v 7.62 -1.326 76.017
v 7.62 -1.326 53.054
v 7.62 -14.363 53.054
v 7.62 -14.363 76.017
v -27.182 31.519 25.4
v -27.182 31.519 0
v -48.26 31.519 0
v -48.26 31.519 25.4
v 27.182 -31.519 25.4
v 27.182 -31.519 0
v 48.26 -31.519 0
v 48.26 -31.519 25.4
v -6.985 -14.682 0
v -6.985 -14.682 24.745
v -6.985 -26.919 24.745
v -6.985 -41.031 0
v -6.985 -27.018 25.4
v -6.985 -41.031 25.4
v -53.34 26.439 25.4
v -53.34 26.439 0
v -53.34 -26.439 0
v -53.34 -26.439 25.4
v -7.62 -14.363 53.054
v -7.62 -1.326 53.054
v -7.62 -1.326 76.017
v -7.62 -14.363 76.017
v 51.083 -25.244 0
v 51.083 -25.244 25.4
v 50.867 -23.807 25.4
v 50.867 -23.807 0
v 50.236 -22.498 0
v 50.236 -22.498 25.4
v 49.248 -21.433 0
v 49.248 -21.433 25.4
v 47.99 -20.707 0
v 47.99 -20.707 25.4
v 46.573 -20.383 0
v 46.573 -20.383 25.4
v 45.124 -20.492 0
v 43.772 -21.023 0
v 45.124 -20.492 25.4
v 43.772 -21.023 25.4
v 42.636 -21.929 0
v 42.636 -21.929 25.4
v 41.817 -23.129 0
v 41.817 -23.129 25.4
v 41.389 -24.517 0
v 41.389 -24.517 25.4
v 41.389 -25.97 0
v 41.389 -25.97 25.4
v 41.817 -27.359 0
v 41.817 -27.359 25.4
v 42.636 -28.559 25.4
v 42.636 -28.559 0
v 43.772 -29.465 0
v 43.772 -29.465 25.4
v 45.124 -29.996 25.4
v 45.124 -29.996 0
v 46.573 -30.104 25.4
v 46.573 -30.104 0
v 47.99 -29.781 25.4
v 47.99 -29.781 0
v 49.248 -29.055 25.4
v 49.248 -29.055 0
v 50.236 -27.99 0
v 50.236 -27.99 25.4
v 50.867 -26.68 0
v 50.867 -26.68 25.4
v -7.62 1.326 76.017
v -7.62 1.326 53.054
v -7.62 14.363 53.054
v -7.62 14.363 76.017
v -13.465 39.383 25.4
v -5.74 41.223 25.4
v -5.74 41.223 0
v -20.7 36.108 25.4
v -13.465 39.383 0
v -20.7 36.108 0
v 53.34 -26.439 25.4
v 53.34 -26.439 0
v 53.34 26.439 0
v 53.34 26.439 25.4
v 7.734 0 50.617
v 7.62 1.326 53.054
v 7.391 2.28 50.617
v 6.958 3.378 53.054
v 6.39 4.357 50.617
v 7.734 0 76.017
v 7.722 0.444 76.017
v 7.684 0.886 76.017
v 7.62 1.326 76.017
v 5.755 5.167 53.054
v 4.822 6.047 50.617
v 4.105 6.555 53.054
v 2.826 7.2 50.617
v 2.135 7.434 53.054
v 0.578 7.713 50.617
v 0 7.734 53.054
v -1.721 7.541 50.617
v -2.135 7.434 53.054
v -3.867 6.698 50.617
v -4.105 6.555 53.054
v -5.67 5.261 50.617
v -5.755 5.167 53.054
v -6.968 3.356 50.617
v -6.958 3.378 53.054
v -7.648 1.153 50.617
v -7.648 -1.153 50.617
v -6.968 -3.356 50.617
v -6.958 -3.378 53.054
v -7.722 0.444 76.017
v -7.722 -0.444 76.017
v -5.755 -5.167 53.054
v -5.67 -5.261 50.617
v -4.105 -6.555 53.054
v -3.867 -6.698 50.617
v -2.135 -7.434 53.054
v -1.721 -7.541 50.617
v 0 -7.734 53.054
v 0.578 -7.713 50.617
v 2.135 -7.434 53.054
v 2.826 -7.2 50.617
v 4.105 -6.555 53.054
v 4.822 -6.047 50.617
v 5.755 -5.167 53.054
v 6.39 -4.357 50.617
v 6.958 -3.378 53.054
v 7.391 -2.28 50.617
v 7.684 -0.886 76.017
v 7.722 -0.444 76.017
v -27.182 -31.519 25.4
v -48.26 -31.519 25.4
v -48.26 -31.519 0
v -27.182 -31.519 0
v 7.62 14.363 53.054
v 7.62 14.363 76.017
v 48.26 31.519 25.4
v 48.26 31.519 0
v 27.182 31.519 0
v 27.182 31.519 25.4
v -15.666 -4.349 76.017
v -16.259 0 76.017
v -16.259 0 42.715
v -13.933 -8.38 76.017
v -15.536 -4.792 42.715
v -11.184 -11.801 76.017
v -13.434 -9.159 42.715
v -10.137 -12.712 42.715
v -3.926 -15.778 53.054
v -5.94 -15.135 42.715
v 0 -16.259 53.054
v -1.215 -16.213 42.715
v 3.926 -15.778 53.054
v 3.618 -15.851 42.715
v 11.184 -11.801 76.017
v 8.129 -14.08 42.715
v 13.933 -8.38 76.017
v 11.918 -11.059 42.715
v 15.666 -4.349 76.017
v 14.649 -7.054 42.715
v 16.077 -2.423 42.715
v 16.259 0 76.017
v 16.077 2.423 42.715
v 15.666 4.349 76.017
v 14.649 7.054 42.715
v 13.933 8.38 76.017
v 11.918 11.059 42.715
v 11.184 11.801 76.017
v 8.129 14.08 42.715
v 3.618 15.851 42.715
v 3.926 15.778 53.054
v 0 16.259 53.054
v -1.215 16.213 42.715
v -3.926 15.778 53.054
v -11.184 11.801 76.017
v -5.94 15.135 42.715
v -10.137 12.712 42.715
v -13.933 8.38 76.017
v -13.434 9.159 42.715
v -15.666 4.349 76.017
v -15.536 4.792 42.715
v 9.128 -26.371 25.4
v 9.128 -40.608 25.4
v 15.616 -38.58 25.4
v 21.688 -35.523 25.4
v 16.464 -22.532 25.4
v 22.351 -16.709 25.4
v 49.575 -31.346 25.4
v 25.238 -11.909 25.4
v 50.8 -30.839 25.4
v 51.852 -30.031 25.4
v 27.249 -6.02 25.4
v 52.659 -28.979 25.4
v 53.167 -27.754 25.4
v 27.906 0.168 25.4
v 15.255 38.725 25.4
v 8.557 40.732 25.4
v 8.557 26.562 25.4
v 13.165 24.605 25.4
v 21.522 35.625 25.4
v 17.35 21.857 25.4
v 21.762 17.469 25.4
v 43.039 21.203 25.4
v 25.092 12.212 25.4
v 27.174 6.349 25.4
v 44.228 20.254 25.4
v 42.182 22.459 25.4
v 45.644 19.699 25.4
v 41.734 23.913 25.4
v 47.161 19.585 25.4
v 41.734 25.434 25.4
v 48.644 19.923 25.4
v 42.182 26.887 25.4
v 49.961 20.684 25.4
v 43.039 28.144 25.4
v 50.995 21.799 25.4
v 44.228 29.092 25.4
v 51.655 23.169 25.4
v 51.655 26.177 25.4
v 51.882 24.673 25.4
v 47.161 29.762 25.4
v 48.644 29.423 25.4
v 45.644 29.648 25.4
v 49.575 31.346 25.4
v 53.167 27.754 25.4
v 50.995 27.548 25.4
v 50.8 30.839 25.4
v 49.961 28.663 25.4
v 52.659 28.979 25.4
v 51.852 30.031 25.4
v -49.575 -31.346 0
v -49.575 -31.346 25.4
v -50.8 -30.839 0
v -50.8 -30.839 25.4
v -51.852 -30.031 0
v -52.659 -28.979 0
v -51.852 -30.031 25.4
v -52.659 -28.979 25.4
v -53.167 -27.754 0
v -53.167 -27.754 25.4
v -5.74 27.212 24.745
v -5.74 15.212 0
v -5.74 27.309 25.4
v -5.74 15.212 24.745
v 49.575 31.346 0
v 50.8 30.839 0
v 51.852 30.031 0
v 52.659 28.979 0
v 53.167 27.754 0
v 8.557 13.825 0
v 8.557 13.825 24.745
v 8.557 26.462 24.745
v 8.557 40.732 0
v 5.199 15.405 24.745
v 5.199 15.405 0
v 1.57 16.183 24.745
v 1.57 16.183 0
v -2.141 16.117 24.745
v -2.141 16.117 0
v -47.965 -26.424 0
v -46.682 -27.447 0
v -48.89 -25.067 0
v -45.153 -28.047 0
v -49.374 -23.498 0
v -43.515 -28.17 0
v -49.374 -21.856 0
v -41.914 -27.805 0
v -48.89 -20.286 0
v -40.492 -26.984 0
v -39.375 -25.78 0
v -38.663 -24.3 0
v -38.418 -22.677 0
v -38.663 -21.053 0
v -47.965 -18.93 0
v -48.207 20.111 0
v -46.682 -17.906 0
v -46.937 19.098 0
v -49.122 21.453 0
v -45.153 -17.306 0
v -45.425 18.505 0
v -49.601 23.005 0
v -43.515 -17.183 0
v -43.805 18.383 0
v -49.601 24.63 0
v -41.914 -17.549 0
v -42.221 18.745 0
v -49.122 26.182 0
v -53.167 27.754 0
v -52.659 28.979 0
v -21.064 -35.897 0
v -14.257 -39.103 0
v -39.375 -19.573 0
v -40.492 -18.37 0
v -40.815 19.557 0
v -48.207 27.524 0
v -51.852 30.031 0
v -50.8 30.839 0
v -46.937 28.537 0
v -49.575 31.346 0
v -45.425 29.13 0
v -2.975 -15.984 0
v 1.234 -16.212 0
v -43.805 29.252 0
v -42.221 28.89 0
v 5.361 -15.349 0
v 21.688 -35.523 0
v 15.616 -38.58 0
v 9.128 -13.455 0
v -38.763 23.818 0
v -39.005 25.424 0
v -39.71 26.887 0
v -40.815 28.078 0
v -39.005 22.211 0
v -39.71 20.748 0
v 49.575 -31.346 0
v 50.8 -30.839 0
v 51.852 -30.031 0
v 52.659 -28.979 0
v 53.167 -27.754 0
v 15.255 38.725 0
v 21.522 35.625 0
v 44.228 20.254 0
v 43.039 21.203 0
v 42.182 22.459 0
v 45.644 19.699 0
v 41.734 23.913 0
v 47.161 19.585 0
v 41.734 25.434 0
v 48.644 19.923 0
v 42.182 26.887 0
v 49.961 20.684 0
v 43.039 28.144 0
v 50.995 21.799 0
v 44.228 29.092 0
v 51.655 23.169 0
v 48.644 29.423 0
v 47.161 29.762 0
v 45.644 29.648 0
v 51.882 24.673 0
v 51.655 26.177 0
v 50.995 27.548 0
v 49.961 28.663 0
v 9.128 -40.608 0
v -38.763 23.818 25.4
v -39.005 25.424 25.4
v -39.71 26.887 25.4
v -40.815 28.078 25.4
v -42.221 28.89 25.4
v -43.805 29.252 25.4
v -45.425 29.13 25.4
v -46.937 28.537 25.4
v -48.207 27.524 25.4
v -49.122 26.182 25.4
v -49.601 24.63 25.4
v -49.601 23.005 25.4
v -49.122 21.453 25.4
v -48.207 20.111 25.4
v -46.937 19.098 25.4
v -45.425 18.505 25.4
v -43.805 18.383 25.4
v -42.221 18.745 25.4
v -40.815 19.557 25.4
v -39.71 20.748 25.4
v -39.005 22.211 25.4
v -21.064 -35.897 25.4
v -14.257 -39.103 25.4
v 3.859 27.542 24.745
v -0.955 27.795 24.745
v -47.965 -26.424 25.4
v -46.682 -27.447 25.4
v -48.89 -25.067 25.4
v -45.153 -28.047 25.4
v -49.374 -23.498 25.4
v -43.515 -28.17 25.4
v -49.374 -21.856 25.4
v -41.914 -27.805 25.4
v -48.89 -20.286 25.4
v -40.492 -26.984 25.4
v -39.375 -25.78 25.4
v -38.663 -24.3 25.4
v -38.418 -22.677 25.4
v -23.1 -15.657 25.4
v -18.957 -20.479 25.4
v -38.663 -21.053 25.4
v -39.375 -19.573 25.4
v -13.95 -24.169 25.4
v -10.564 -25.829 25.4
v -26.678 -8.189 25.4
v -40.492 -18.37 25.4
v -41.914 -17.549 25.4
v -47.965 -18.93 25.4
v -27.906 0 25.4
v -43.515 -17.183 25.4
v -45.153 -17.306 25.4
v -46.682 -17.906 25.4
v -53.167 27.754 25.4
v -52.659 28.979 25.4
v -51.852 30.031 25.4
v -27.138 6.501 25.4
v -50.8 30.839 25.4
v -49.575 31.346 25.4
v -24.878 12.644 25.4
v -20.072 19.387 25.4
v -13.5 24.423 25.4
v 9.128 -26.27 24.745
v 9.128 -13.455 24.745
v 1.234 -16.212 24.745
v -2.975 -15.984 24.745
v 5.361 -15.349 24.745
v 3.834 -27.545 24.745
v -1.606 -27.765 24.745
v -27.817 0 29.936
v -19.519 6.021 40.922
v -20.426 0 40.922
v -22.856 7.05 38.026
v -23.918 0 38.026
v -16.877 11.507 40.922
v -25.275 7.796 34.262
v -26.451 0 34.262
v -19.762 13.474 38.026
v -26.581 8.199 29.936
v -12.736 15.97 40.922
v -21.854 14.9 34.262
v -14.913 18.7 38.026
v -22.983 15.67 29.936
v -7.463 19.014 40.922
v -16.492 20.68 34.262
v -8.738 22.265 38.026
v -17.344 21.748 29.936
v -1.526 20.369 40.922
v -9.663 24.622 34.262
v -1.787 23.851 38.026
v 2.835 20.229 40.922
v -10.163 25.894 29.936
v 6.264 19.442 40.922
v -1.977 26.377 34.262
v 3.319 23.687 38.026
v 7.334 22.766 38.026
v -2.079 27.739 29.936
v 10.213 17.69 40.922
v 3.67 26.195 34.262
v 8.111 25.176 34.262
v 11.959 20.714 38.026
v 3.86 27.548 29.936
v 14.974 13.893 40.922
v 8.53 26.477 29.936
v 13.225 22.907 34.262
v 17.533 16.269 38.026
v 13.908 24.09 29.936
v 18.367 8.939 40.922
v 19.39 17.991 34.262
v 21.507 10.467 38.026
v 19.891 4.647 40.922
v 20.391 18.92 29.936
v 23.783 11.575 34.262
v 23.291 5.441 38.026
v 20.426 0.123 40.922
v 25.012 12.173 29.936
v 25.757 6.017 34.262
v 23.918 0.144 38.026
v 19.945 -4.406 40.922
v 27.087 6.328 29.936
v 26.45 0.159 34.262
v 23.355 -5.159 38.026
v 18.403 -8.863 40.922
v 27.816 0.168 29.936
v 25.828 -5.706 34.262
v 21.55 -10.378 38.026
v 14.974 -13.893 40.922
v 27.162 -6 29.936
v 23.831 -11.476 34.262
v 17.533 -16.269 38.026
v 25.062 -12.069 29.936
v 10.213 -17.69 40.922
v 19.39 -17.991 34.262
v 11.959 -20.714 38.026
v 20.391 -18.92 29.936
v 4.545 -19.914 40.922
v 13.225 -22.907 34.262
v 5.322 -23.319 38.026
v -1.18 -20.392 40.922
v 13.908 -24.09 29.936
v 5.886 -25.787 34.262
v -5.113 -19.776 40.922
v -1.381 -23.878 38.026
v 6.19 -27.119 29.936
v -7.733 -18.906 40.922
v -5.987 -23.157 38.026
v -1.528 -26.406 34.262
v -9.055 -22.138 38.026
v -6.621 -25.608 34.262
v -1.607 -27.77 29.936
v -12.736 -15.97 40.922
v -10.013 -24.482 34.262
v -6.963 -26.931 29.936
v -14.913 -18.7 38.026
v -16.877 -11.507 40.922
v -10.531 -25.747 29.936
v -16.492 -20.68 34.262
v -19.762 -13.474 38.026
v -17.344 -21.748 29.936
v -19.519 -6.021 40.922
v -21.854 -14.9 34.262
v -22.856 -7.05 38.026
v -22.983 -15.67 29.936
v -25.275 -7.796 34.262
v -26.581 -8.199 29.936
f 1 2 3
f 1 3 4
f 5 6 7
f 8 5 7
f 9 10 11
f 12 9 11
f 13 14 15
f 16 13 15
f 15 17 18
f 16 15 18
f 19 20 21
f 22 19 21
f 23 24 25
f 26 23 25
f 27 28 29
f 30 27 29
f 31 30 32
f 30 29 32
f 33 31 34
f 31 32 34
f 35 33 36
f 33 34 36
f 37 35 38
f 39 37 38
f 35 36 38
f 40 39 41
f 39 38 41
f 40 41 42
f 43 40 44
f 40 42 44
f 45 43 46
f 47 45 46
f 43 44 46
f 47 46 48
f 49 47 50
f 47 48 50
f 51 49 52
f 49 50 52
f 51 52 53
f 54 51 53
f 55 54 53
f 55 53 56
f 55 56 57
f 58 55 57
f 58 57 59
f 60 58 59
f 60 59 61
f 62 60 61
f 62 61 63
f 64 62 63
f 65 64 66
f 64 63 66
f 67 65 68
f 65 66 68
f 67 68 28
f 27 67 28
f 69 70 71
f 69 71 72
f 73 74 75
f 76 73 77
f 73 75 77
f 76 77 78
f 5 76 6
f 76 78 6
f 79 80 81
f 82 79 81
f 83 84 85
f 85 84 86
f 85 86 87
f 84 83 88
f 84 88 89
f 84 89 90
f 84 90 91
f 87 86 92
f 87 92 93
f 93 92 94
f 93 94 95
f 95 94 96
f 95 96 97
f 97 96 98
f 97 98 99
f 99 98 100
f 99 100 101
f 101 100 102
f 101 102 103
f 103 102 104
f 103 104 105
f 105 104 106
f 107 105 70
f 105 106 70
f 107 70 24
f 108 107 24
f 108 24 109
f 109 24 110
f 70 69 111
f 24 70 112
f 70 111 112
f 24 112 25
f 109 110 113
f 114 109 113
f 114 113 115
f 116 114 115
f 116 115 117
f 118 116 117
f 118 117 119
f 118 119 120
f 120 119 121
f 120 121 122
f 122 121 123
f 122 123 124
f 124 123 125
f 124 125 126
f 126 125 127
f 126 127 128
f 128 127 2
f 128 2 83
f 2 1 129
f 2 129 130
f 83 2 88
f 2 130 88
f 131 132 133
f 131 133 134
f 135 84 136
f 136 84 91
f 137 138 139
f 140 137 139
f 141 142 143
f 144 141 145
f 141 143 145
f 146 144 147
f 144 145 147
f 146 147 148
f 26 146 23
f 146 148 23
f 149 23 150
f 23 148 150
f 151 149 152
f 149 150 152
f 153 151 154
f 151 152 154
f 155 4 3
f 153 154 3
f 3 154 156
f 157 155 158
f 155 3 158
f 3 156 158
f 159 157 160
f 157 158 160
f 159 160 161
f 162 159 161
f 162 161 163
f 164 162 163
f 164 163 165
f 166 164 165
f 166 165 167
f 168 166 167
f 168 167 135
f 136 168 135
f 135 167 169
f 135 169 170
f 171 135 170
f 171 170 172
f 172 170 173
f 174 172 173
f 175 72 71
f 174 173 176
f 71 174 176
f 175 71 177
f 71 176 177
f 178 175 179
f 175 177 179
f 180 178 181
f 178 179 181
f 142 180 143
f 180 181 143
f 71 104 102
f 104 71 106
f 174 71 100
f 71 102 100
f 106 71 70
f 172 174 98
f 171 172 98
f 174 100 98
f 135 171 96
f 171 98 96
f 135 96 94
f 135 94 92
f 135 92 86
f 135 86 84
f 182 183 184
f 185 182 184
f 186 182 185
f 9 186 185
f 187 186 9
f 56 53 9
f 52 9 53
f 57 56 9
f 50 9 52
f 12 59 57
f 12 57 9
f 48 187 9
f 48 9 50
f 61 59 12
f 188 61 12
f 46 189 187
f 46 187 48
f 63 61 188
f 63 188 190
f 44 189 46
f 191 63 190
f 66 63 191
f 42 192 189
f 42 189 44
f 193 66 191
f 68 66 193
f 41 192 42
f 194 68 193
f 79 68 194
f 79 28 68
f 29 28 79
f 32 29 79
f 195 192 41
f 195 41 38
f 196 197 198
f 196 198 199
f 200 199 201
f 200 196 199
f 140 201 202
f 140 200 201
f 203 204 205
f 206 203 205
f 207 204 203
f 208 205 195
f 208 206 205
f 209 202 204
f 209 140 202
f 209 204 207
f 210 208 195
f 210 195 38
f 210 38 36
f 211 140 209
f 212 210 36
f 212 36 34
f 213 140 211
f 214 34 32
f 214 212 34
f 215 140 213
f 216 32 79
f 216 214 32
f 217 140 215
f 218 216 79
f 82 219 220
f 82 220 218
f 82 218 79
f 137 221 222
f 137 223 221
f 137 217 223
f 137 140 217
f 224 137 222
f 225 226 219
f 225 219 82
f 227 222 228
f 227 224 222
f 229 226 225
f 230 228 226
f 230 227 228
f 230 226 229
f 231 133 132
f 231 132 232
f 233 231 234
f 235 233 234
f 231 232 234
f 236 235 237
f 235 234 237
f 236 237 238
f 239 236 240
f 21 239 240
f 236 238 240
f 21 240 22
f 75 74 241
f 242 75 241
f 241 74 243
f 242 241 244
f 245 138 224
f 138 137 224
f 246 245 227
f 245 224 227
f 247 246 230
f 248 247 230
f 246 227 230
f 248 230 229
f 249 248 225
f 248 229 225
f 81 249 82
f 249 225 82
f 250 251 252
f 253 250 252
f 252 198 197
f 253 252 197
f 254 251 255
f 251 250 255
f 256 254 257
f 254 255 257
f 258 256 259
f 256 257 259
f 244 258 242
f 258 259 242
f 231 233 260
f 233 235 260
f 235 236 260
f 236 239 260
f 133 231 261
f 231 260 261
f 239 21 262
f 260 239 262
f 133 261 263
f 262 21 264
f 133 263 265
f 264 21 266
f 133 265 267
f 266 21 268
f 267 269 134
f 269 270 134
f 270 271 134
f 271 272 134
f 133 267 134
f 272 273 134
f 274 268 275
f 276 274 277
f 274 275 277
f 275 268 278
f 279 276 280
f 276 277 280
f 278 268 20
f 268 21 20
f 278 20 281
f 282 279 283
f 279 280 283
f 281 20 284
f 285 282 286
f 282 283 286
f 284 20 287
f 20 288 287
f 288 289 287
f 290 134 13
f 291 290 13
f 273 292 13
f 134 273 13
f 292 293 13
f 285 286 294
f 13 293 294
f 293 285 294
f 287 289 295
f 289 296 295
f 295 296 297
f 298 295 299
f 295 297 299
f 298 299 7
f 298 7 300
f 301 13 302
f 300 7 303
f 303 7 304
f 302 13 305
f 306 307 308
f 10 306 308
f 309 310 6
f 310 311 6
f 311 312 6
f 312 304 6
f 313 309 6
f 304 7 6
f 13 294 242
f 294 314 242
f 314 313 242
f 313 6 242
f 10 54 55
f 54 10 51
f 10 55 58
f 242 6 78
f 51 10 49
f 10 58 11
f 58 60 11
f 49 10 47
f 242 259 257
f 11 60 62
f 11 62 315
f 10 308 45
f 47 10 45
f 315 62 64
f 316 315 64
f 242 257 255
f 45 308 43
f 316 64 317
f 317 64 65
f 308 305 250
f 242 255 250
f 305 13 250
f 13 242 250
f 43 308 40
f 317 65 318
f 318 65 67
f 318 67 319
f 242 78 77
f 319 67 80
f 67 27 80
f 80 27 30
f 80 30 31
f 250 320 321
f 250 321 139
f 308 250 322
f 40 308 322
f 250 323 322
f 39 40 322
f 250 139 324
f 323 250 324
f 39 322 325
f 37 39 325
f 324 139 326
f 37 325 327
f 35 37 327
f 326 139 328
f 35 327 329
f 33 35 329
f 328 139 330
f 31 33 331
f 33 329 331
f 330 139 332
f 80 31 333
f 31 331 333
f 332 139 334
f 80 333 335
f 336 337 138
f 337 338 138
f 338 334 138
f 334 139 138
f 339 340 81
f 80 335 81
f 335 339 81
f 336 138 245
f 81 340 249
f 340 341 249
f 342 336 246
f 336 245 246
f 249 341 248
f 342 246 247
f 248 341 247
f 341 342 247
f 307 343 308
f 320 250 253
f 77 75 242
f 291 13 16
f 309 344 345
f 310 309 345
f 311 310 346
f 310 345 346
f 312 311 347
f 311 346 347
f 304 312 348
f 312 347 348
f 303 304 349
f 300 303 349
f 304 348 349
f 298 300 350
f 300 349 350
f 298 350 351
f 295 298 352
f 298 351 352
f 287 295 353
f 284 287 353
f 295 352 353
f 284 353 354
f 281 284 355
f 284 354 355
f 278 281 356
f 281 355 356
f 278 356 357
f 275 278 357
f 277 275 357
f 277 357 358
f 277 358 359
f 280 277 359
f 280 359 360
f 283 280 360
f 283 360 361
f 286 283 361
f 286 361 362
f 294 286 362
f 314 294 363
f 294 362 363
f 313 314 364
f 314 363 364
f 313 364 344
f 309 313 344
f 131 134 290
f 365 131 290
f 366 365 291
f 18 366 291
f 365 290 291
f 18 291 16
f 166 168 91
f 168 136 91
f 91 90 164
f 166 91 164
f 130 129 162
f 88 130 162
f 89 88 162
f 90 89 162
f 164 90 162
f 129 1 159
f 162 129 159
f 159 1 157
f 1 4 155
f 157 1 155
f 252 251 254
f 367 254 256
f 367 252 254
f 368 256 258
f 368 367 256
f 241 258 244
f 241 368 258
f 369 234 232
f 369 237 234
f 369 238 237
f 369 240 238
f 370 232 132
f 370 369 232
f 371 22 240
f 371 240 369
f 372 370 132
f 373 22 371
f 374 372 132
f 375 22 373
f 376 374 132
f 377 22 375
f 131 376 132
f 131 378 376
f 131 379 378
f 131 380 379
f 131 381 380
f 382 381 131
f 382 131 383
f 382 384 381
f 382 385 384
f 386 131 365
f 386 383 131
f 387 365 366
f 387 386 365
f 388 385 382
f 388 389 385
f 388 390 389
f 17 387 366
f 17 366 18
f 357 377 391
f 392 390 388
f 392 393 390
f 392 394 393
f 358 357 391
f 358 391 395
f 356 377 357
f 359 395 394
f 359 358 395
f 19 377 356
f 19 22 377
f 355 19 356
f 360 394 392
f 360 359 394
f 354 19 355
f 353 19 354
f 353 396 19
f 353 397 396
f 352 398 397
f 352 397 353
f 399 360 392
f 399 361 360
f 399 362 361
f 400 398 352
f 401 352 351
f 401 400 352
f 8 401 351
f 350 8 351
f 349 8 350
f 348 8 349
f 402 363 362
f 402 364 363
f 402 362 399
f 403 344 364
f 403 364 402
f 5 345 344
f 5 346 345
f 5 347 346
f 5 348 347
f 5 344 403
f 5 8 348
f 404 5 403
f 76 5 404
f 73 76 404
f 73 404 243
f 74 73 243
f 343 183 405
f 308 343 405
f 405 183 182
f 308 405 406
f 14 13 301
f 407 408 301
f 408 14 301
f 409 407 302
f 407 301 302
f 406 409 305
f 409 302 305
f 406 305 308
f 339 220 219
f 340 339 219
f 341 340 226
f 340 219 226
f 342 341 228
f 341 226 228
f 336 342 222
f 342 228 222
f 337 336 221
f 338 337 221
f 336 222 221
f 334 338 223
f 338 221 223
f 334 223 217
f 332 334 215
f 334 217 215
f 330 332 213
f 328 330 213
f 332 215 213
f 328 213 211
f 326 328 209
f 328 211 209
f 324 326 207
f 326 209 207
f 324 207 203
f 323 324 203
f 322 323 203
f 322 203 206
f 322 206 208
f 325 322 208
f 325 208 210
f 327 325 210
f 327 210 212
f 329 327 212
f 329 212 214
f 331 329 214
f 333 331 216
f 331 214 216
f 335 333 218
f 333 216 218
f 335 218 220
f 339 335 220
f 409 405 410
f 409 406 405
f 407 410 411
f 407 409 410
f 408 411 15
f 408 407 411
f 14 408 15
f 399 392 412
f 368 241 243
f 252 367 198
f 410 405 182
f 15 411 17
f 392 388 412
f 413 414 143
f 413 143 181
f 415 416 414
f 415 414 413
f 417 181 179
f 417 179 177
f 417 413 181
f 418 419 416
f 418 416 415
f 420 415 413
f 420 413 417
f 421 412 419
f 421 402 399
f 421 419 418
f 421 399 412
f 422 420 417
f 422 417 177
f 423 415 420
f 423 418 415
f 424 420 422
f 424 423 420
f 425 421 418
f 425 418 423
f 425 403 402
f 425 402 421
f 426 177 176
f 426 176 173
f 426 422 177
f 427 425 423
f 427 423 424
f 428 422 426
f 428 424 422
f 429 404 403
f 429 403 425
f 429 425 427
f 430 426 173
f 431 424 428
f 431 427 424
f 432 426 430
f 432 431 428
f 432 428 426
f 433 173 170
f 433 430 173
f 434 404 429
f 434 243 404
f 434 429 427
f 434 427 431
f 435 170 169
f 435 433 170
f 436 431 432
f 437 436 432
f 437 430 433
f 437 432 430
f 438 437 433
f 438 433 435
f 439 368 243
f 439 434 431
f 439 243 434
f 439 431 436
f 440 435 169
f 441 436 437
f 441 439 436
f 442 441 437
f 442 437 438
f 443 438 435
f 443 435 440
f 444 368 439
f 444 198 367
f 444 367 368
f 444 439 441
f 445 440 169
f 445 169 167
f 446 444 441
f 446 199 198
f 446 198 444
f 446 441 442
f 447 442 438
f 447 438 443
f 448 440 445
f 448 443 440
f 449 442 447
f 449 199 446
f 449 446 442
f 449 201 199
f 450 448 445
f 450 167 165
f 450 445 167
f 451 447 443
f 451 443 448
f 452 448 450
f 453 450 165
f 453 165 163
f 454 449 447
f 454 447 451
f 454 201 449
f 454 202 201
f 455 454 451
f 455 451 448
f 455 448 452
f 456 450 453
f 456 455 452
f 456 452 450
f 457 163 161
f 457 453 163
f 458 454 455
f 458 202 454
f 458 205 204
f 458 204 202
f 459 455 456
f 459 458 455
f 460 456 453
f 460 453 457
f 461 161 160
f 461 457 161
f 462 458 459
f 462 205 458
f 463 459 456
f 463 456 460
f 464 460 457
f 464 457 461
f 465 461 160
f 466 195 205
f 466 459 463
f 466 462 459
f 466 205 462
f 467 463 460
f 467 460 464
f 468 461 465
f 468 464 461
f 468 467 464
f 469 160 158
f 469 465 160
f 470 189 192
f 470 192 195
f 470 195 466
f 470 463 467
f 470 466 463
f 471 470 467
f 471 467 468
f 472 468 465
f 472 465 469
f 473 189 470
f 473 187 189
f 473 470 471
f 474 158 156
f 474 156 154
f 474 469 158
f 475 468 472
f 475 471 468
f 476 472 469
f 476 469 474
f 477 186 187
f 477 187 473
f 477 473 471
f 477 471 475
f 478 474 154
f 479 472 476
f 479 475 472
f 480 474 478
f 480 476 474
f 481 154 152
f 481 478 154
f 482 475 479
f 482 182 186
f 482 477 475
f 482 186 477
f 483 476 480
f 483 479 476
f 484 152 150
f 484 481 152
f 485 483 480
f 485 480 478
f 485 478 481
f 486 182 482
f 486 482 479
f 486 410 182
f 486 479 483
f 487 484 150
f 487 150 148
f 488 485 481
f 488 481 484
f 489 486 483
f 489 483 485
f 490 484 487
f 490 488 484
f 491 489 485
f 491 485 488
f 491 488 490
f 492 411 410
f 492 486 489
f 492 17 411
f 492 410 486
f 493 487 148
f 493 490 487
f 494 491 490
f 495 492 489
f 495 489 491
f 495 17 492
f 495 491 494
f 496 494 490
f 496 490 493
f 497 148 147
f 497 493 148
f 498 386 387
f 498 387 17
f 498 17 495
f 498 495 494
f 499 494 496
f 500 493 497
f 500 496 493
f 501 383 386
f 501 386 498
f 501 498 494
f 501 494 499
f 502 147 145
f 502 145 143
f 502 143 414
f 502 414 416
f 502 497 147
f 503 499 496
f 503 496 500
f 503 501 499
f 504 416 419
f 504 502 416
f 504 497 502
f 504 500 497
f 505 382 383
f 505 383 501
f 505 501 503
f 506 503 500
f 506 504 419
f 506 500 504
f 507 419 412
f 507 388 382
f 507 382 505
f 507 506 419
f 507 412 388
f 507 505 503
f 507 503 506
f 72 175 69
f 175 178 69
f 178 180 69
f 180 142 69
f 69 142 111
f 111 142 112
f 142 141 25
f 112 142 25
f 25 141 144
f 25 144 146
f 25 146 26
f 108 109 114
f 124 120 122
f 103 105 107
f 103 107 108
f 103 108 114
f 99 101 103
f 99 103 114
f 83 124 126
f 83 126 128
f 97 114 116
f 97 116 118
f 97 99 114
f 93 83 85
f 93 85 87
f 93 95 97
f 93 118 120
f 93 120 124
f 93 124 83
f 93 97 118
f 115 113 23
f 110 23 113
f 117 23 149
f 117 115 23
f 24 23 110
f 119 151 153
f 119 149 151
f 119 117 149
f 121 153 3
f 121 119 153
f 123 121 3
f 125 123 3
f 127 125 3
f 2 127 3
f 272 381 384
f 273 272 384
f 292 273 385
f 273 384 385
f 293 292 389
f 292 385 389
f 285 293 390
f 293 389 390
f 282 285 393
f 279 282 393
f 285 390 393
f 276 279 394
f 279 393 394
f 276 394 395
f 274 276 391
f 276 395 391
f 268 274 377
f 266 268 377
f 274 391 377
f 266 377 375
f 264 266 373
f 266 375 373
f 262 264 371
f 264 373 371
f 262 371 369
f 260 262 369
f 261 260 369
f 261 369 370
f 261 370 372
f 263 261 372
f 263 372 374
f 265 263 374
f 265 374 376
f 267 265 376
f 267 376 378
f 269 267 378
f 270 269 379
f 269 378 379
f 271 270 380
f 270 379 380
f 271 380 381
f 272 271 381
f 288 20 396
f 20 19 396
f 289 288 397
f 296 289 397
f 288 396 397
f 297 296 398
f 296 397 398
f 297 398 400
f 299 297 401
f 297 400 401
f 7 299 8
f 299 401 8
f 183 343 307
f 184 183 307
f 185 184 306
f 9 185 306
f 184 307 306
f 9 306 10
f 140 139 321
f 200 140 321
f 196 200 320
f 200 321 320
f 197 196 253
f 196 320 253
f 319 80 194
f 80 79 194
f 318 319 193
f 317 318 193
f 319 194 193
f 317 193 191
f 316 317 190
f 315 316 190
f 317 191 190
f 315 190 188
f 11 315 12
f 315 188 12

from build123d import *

# Parameters (mm, degrees)
F1_DEPTH       = 25.4
F2_R           = 5.4495134178
F2_R_2         = 5.5089125438
F3_DEPTH       = 25.4
F4_R           = 5.1025387704
F4_R_2         = 4.874193153
F5_DEPTH       = 25.4
F7_DEPTH       = 25.4
F9_DEPTH       = 25.4
F10_R          = 5.08
F15_R          = 7.7344411216
F16_DEPTH      = 25.4
F17_W          = 15.24
F17_H          = 33.801519665
F18_DEPTH      = 25.4
F18_DEPTH_BACK = 25.4


# Not quite as in the source:
# - a feature of the source that left no trace in its solid (it failed there, or was rolled back) is left out


with BuildPart() as f1:
    # F0 (on Top) → F1 (new body)
    with BuildSketch(Plane.XY):
        with BuildLine():
            Line((-53.3399991691, -31.5190926194), (-27.1817994649, -31.5190926194))
            ThreePointArc((-27.1817994649, -31.5190926194), (-41.6209493128, 0), (-27.1817994649, 31.5190926194))
            Line((-27.1817994649, 31.5190926194), (-53.3399991691, 31.5190926194))
            Line((-53.3399991691, 31.5190926194), (-53.3399991691, -31.5190926194))
        make_face()
        with BuildLine():
            Line((27.1817994649, -31.5190926194), (53.3399991691, -31.5190926194))
            Line((53.3399991691, -31.5190926194), (53.3399991691, 31.5190926194))
            Line((53.3399991691, 31.5190926194), (27.1817994649, 31.5190926194))
            ThreePointArc((27.1817994649, 31.5190926194), (37.8393691772, 17.3345193752), (41.6209493128, 0))
            ThreePointArc((41.6209493128, 0), (37.8393691772, -17.3345193752), (27.1817994649, -31.5190926194))
        make_face()
        with BuildLine():
            ThreePointArc((-27.1817994649, -31.5190926194), (0, -41.6209493128), (27.1817994649, -31.5190926194))
            Line((27.1817994649, -31.5190926194), (-27.1817994649, -31.5190926194))
        make_face()
        with BuildLine():
            Line((-27.1817994649, 31.5190926194), (27.1817994649, 31.5190926194))
            ThreePointArc((27.1817994649, 31.5190926194), (0, 41.6209493128), (-27.1817994649, 31.5190926194))
        make_face()
        with BuildLine():
            Line((-27.1817994649, -31.5190926194), (27.1817994649, -31.5190926194))
            ThreePointArc((27.1817994649, -31.5190926194), (37.8393691772, -17.3345193752), (41.6209493128, 0))
            ThreePointArc((41.6209493128, 0), (37.8393691772, 17.3345193752), (27.1817994649, 31.5190926194))
            Line((27.1817994649, 31.5190926194), (-27.1817994649, 31.5190926194))
            ThreePointArc((-27.1817994649, 31.5190926194), (-41.6209493128, 0), (-27.1817994649, -31.5190926194))
        make_face()
    extrude(amount=F1_DEPTH)

    # F2 (on face) → F3 (cut)
    with BuildSketch(Plane.XY.offset(25.4)):
        with Locations((-44.2123003304, 23.8175932318)):
            Circle(F2_R)
        with Locations((-43.9270585775, -22.6766318083)):
            Circle(F2_R_2)
    extrude(amount=-F3_DEPTH, mode=Mode.SUBTRACT)

    # F4 (on face) → F5 (cut)
    with BuildSketch(Plane.XY.offset(25.4)):
        with Locations((46.7794649303, 24.6733147651)):
            Circle(F4_R)
        with Locations((46.2089851499, -25.2437964082)):
            Circle(F4_R_2)
    extrude(amount=-F5_DEPTH, mode=Mode.SUBTRACT)

    # F6 (on face) → F7 (cut)
    with BuildSketch(Plane.XY.offset(25.4)):
        with BuildLine():
            Line((-6.9852194627, -11.5522462875), (-6.9852194627, -41.0305999317))
            Line((-6.9852194627, -41.0305999317), (6.9852194627, -41.0305999317))
            ThreePointArc((6.9852194627, -41.0305999317), (8.0592339465, -40.8332238489), (9.1277007014, -40.6077394299))
            Line((9.1277007014, -40.6077394299), (9.1277007014, -11.5522462875))
            Line((9.1277007014, -11.5522462875), (-6.9852194627, -11.5522462875))
        make_face()
        with BuildLine():
            Line((6.9852194627, -41.0305999317), (-6.9852194627, -41.0305999317))
            ThreePointArc((-6.9852194627, -41.0305999317), (0, -41.6209493128), (6.9852194627, -41.0305999317))
        make_face()
        with BuildLine():
            Line((5.7398033244, 41.2232710917), (-5.7398033244, 41.2232710917))
            Line((-5.7398033244, 41.2232710917), (-5.7398033244, 11.2670054659))
            Line((-5.7398033244, 11.2670054659), (8.5572190583, 11.2670054659))
            Line((8.5572190583, 11.2670054659), (8.5572190583, 40.7317741289))
            ThreePointArc((8.5572190583, 40.7317741289), (7.1527340625, 41.0017294407), (5.7398033244, 41.2232710917))
        make_face()
    extrude(amount=-F7_DEPTH, mode=Mode.SUBTRACT)

    # F9 (cut): a face of the model
    f9_faces = [f1.faces().sort_by_distance(p)[0] for p in [
        (0, 41.2232710917, 12.7),
    ]]
    extrude(f9_faces, amount=-F9_DEPTH, mode=Mode.SUBTRACT)

    # F10
    f10_edges = [f1.edges().sort_by_distance(p)[0] for p in [
        (53.339999, -31.519093, 12.7),
        (53.339999, 31.519093, 12.7),
        (-53.339999, -31.519093, 12.7),
        (-53.339999, 31.519093, 12.7),
    ]]
    fillet(f10_edges, radius=F10_R)

    # F11 (on Front) → F12 (revolve)
    with BuildSketch(Plane.XZ):
        Polygon((-16.2587165833, 0), (0, 0), (0, 76.0166272521), (-16.2587165833, 76.0166272521), (-16.2587165833, 42.7147820592), (-16.2587165833, 24.7446224093), align=None)
    revolve(axis=Axis((0, 0, 38.0083136261), (0, 0, 1)))

    # F11 (on Front) → F13 (revolve)
    with BuildSketch(Plane.XZ):
        Polygon((-16.2587165833, 0), (0, 0), (0, 76.0166272521), (-16.2587165833, 76.0166272521), (-16.2587165833, 42.7147820592), (-16.2587165833, 24.7446224093), align=None)
        with BuildLine():
            Line((-27.8109610081, 24.7446224093), (-16.2587165833, 24.7446224093))
            Line((-16.2587165833, 24.7446224093), (-16.2587165833, 42.7147820592))
            ThreePointArc((-16.2587165833, 42.7147820592), (-25.501298739, 35.958140564), (-27.8109610081, 24.7446224093))
        make_face()
    revolve(axis=Axis((0, 0, 76.0166272521), (0, 0, -1)))

    # F15 (on face) → F16 (cut)
    with BuildSketch(Plane.XY.offset(76.0166272521)):
        Circle(F15_R)
    extrude(amount=-F16_DEPTH, mode=Mode.SUBTRACT)

    # F17 (on Front) → F18 (cut, two sides)
    with BuildSketch(Plane.XZ) as f18_sk:
        with Locations((0, 69.9550167755)):
            Rectangle(F17_W, F17_H)
    extrude(amount=-F18_DEPTH, mode=Mode.SUBTRACT)
    extrude(f18_sk.sketch, amount=F18_DEPTH_BACK, mode=Mode.SUBTRACT)


solid = f1.part
